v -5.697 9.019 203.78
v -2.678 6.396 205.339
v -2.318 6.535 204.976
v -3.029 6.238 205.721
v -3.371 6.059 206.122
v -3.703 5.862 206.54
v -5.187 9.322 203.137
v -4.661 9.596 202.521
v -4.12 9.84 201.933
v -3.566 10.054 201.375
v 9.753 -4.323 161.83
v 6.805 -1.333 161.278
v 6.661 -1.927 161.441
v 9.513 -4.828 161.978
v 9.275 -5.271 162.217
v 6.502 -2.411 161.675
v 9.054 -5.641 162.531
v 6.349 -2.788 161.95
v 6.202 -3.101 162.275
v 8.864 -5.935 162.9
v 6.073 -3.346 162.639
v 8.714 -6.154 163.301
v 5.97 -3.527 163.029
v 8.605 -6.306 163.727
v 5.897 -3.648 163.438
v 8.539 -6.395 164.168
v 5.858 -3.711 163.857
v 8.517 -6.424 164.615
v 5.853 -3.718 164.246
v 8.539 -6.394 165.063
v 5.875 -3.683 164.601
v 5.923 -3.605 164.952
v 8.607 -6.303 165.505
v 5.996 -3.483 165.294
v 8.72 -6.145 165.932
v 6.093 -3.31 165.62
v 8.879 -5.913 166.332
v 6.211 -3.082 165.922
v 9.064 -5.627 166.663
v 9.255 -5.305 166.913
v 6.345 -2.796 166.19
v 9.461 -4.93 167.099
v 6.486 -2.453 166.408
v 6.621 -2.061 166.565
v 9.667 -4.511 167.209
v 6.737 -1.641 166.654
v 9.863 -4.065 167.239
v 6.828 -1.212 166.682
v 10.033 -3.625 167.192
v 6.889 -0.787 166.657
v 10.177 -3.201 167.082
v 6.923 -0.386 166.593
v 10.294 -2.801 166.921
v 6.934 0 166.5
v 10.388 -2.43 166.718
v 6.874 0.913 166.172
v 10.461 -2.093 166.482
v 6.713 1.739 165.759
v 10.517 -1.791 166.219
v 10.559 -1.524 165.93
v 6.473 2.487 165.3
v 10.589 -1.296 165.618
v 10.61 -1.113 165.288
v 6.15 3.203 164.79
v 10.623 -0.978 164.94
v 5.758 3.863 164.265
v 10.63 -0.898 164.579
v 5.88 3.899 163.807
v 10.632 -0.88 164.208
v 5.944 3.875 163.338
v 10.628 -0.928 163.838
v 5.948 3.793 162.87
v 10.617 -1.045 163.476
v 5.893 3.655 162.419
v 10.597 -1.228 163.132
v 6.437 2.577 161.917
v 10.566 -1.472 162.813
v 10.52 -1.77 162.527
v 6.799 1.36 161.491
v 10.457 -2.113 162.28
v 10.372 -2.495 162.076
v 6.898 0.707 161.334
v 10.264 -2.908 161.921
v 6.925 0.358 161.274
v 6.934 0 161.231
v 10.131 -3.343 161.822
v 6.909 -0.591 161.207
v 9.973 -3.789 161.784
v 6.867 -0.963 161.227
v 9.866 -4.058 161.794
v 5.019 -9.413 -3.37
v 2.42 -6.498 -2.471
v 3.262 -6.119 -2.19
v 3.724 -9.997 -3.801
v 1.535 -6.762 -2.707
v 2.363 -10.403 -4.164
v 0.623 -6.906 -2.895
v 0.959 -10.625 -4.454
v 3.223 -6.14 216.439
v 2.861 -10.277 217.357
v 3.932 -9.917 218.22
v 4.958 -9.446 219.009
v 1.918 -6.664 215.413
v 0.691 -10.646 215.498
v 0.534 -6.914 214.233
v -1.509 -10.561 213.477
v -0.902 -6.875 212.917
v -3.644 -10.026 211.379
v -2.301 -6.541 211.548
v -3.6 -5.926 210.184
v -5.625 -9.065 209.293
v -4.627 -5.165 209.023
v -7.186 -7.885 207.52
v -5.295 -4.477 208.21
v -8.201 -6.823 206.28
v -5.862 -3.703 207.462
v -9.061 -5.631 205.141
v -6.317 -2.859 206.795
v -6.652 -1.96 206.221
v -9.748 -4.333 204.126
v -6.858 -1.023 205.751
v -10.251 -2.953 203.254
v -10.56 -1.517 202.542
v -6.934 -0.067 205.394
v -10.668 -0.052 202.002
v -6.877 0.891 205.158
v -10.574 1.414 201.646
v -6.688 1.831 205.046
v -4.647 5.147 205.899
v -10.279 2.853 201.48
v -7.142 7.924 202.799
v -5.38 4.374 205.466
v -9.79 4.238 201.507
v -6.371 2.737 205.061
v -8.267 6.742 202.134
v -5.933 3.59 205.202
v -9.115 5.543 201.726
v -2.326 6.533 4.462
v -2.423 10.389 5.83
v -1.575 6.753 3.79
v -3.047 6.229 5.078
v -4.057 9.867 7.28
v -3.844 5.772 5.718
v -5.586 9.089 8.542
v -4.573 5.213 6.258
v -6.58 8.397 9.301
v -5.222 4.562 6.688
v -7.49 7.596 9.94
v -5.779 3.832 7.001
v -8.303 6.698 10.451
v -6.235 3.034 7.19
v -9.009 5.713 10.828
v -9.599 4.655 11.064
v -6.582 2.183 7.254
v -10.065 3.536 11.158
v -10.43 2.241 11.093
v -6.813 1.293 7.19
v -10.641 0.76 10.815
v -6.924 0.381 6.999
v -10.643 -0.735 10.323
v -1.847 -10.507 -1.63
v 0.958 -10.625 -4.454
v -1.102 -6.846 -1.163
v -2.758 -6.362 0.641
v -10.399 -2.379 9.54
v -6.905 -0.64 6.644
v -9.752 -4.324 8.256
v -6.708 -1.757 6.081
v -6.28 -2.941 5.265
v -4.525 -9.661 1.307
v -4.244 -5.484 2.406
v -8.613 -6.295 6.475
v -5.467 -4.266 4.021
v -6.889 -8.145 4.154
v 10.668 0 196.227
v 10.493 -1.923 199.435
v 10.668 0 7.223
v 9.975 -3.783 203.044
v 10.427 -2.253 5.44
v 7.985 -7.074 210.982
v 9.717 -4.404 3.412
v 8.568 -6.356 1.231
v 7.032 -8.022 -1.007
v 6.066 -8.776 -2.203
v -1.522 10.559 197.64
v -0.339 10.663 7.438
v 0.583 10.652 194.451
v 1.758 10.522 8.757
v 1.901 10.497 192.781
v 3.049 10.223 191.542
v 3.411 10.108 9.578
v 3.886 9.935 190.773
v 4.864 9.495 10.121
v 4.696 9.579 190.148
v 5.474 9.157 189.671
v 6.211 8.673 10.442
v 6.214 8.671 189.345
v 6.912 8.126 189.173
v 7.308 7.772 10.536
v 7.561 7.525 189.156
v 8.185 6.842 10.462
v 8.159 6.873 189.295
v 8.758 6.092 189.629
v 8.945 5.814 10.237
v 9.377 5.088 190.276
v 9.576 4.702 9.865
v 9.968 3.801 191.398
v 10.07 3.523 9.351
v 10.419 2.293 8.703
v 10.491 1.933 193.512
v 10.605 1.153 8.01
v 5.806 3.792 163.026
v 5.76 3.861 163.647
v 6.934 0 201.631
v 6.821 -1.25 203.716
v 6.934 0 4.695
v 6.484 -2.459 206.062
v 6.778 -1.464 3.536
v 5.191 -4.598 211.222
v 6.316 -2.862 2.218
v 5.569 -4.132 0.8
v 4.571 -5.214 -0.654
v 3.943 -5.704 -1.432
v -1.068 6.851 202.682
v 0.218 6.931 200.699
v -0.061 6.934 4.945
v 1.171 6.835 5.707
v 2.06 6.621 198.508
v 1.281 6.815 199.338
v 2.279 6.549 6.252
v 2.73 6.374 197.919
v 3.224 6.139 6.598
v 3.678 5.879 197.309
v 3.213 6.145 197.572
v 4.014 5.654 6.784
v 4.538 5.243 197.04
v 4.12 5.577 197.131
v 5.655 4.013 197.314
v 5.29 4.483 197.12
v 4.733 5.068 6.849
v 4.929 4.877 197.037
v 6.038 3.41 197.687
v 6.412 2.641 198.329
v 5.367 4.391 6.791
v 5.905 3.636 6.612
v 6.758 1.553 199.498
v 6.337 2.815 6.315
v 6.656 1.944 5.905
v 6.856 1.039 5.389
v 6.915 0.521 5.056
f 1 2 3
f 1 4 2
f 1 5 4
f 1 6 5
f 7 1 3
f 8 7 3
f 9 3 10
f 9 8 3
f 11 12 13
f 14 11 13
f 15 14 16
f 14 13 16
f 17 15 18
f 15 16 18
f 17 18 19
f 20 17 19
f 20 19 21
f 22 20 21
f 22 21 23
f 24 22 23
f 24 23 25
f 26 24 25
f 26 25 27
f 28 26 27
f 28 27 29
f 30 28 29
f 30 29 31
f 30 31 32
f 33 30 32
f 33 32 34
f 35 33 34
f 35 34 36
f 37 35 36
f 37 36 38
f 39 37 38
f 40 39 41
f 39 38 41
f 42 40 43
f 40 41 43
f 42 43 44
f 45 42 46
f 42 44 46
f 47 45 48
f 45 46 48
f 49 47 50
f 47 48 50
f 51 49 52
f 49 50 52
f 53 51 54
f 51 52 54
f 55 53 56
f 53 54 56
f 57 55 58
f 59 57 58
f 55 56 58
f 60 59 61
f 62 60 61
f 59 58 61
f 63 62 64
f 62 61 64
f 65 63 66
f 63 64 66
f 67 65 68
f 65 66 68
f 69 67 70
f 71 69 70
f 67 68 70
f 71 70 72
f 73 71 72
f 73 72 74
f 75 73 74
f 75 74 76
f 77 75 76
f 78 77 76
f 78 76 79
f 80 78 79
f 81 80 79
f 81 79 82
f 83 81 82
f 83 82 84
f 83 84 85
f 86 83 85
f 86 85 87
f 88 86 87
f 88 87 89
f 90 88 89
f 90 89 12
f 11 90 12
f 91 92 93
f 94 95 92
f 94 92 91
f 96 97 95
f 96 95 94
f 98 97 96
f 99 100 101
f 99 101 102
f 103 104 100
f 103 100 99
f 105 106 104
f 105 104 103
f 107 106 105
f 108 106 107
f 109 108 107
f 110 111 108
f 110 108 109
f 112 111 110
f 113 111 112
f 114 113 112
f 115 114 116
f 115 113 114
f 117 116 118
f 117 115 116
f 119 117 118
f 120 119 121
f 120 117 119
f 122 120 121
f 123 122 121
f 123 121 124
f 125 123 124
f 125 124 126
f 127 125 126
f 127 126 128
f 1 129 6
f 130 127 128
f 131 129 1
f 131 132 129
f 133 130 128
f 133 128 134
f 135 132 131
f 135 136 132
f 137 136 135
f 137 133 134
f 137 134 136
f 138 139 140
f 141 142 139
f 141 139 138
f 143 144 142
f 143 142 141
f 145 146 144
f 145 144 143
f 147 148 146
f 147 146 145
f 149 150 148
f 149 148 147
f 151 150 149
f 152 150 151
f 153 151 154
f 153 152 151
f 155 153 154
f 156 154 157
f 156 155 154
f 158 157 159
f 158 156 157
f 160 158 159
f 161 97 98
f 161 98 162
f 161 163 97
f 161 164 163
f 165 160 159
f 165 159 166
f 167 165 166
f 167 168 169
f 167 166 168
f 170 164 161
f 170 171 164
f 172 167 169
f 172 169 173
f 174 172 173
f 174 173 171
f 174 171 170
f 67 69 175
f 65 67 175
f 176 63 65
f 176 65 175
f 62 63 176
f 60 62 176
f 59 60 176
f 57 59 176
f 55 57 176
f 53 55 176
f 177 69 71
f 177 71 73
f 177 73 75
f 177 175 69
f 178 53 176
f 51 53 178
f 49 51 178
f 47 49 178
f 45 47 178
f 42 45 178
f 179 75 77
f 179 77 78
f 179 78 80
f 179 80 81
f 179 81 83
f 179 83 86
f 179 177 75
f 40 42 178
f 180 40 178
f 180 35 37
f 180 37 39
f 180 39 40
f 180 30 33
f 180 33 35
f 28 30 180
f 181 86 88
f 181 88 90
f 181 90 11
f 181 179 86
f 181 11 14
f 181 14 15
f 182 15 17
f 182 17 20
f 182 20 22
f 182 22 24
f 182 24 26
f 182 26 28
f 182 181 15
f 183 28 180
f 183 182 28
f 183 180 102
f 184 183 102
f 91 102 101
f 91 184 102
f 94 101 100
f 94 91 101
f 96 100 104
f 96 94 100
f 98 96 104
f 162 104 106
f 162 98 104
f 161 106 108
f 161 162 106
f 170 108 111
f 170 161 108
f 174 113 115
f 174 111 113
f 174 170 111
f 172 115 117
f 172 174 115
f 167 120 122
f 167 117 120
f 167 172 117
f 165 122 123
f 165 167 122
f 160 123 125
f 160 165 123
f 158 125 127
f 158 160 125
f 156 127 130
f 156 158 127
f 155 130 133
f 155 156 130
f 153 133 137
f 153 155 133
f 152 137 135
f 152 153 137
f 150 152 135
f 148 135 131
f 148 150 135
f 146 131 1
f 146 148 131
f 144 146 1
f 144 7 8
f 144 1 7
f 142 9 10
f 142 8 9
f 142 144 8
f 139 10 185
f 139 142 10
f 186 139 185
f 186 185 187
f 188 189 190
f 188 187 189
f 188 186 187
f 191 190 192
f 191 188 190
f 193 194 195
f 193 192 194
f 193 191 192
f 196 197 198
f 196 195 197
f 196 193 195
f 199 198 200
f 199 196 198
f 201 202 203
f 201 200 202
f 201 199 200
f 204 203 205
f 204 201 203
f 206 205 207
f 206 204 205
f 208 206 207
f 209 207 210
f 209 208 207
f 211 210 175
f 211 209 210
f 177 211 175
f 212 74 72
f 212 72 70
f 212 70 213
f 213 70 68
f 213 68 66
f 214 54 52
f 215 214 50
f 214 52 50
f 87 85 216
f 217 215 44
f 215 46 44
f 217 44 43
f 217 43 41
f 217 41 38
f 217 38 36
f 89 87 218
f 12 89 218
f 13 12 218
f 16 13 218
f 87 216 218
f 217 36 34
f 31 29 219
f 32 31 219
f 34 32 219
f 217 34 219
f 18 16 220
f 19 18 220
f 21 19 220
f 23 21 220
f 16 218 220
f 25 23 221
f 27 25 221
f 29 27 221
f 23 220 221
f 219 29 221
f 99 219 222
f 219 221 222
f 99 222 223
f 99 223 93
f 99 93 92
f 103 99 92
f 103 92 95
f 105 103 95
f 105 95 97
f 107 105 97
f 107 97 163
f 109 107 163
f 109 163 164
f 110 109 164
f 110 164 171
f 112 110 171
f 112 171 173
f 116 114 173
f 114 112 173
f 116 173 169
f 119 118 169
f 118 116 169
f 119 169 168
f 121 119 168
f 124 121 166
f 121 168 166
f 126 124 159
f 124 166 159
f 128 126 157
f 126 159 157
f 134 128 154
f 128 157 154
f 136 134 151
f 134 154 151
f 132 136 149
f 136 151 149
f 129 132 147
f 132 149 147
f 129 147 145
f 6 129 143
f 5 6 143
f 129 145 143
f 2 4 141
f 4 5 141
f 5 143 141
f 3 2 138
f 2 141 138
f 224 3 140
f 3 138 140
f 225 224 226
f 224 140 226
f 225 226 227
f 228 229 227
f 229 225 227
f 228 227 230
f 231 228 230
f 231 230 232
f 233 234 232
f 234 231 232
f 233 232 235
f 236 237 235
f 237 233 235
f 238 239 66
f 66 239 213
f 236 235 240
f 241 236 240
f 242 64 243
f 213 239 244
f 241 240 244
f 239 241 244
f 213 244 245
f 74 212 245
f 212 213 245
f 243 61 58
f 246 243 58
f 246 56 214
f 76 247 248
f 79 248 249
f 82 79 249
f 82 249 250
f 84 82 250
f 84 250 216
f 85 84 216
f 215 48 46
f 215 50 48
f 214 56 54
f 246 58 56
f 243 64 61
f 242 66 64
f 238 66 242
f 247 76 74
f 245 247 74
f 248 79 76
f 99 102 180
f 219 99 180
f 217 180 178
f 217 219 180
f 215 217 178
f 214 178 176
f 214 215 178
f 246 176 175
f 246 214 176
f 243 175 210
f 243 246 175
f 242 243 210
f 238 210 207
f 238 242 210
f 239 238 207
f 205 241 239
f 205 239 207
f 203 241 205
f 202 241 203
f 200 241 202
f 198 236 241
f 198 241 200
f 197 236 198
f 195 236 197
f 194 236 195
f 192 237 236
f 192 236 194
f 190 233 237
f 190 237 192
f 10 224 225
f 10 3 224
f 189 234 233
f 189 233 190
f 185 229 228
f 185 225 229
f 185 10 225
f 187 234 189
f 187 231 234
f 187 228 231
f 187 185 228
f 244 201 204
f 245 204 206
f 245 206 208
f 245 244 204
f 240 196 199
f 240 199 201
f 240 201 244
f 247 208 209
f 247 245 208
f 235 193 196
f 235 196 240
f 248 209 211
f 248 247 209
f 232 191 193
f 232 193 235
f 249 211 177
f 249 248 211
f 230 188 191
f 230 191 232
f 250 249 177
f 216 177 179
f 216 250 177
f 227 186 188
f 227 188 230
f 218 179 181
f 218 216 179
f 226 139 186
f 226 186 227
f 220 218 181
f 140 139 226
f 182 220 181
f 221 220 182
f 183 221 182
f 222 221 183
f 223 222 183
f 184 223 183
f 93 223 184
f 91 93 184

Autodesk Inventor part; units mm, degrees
ref_plane "Start Plane" through (0, 0, -4.4541) normal (0, 0, 1) x (1, 0, 0)
ref_plane "End Plane" through (0, 0, 219.0092) normal (0, 0, 1) x (1, 0, 0)
sketch "Sketch" plane through (0, 0, 0) normal (0, 0, 1) x (1, 0, 0)
  circle A0 centre (0, 0) radius 6.9342
  circle A1 centre (0, 0) radius 10.668
  dimension "d0" = 21.336
  dimension "d1" = 3.7338
extrude "Body" add sketch "Sketch" along normal up to surface (223.4633 mm away) from surface at -4.4541
sketch "Sketch3" plane through (0, 0, 0) normal (0, 0, 1) x (1, 0, 0)
  line L0 (0, 0) -> (10, 0)
ref_plane "Work Plane3" through (0, 0, 0) normal (0, -1, 0) x (1, 0, 0)
sketch "Sketch4" plane through (0, 0, 0) normal (0, -1, 0) x (1, 0, 0)
  line L0 (-2, -4.4541) -> (12, -4.4541)
  line L1 (-2, 219.0092) -> (12, 219.0092)
  dimension "d7" = 223.4633
ref_plane "Work Plane4" through (-3.2535, -10.1598, -4.8357) normal (0.1259, 0.3932, -0.9108) x (0.8223, -0.555, -0.1259)
split "Split1" plane through (-3.2535, -10.1598, -4.8357) removes the side toward (0.1259, 0.3932, -0.9108)
ref_plane "Work Plane5" through (-7.3135, -7.7665, -10.5353) normal (0.4817, 0.5116, -0.7115) x (0.1956, -0.8542, -0.4817)
split "Split2" plane through (-7.3135, -7.7665, -10.5353) removes the side toward (0.4817, 0.5116, -0.7115)
ref_plane "Work Plane6" through (10.1246, -3.3615, -11.1594) normal (-0.686, 0.2278, -0.691) x (-0.5231, 0.5057, 0.686)
split "Split3" plane through (10.1246, -3.3615, -11.1594) removes the side toward (-0.686, 0.2278, -0.691)
ref_plane "Work Plane7" through (-7.3135, -7.7665, 234.1893) normal (0.6196, 0.658, 0.4281) x (0.7312, -0.2855, -0.6196)
split "Split4" plane through (-7.3135, -7.7665, 234.1893) removes the side toward (0.6196, 0.658, 0.4281)
ref_plane "Work Plane8" through (10.1246, -3.3615, 221.8641) normal (-0.6558, 0.2177, 0.7228) x (0.7504, 0.0829, 0.6558)
split "Split5" plane through (10.1246, -3.3615, 221.8641) removes the side toward (-0.6558, 0.2177, 0.7228)
ref_plane "Work Plane9" through (-4.3247, -9.7521, 225.8384) normal (0.3239, 0.7304, 0.6014) x (0.9345, -0.1477, -0.3239)
split "Split6" plane through (-4.3247, -9.7521, 225.8384) removes the side toward (0.3239, 0.7304, 0.6014)
ref_plane "Work Plane10" through (62.1464, 22.3578, 116.7404) normal (0.6961, -0.706, 0.1304) x (0.3669, 0.506, 0.7806)
sketch "Sketch5" plane through (62.1464, 22.3578, 116.7404) normal (0.6961, -0.706, 0.1304) x (0.3669, 0.506, 0.7806)
  circle A0 centre (4.7916, 74.4945) radius 4 projected
  point P0 (-125.244, -21.9347)
hole "Hole1" at (17.9374, -12.1334, 166.0182) direction (-0.6961, 0.706, -0.1304) diameter 5.4 depth 20 tip angle 118
equation "\"d0\" = G_H"
equation "\"d1\" = G_T"
equation "\"d2\" = G_L"
equation "\"G_H\" = 21.336"
equation "\"G_T\" = 3.7338"
equation "\"G_L\" = 223.46334"
equation "\"G_OFFSET_START\" = 4.45413"
equation "\"G_OFFSET_END\" = 7.34335"
equation "\"d4\" = -G_OFFSET_START"
equation "\"d5\" = G_OFFSET_END + B_L"
equation "\"B_L\" = 211.66586"
properties part number "ANSI - 1/2 x 0.147 - 8.798" material "Steel, Mild"
